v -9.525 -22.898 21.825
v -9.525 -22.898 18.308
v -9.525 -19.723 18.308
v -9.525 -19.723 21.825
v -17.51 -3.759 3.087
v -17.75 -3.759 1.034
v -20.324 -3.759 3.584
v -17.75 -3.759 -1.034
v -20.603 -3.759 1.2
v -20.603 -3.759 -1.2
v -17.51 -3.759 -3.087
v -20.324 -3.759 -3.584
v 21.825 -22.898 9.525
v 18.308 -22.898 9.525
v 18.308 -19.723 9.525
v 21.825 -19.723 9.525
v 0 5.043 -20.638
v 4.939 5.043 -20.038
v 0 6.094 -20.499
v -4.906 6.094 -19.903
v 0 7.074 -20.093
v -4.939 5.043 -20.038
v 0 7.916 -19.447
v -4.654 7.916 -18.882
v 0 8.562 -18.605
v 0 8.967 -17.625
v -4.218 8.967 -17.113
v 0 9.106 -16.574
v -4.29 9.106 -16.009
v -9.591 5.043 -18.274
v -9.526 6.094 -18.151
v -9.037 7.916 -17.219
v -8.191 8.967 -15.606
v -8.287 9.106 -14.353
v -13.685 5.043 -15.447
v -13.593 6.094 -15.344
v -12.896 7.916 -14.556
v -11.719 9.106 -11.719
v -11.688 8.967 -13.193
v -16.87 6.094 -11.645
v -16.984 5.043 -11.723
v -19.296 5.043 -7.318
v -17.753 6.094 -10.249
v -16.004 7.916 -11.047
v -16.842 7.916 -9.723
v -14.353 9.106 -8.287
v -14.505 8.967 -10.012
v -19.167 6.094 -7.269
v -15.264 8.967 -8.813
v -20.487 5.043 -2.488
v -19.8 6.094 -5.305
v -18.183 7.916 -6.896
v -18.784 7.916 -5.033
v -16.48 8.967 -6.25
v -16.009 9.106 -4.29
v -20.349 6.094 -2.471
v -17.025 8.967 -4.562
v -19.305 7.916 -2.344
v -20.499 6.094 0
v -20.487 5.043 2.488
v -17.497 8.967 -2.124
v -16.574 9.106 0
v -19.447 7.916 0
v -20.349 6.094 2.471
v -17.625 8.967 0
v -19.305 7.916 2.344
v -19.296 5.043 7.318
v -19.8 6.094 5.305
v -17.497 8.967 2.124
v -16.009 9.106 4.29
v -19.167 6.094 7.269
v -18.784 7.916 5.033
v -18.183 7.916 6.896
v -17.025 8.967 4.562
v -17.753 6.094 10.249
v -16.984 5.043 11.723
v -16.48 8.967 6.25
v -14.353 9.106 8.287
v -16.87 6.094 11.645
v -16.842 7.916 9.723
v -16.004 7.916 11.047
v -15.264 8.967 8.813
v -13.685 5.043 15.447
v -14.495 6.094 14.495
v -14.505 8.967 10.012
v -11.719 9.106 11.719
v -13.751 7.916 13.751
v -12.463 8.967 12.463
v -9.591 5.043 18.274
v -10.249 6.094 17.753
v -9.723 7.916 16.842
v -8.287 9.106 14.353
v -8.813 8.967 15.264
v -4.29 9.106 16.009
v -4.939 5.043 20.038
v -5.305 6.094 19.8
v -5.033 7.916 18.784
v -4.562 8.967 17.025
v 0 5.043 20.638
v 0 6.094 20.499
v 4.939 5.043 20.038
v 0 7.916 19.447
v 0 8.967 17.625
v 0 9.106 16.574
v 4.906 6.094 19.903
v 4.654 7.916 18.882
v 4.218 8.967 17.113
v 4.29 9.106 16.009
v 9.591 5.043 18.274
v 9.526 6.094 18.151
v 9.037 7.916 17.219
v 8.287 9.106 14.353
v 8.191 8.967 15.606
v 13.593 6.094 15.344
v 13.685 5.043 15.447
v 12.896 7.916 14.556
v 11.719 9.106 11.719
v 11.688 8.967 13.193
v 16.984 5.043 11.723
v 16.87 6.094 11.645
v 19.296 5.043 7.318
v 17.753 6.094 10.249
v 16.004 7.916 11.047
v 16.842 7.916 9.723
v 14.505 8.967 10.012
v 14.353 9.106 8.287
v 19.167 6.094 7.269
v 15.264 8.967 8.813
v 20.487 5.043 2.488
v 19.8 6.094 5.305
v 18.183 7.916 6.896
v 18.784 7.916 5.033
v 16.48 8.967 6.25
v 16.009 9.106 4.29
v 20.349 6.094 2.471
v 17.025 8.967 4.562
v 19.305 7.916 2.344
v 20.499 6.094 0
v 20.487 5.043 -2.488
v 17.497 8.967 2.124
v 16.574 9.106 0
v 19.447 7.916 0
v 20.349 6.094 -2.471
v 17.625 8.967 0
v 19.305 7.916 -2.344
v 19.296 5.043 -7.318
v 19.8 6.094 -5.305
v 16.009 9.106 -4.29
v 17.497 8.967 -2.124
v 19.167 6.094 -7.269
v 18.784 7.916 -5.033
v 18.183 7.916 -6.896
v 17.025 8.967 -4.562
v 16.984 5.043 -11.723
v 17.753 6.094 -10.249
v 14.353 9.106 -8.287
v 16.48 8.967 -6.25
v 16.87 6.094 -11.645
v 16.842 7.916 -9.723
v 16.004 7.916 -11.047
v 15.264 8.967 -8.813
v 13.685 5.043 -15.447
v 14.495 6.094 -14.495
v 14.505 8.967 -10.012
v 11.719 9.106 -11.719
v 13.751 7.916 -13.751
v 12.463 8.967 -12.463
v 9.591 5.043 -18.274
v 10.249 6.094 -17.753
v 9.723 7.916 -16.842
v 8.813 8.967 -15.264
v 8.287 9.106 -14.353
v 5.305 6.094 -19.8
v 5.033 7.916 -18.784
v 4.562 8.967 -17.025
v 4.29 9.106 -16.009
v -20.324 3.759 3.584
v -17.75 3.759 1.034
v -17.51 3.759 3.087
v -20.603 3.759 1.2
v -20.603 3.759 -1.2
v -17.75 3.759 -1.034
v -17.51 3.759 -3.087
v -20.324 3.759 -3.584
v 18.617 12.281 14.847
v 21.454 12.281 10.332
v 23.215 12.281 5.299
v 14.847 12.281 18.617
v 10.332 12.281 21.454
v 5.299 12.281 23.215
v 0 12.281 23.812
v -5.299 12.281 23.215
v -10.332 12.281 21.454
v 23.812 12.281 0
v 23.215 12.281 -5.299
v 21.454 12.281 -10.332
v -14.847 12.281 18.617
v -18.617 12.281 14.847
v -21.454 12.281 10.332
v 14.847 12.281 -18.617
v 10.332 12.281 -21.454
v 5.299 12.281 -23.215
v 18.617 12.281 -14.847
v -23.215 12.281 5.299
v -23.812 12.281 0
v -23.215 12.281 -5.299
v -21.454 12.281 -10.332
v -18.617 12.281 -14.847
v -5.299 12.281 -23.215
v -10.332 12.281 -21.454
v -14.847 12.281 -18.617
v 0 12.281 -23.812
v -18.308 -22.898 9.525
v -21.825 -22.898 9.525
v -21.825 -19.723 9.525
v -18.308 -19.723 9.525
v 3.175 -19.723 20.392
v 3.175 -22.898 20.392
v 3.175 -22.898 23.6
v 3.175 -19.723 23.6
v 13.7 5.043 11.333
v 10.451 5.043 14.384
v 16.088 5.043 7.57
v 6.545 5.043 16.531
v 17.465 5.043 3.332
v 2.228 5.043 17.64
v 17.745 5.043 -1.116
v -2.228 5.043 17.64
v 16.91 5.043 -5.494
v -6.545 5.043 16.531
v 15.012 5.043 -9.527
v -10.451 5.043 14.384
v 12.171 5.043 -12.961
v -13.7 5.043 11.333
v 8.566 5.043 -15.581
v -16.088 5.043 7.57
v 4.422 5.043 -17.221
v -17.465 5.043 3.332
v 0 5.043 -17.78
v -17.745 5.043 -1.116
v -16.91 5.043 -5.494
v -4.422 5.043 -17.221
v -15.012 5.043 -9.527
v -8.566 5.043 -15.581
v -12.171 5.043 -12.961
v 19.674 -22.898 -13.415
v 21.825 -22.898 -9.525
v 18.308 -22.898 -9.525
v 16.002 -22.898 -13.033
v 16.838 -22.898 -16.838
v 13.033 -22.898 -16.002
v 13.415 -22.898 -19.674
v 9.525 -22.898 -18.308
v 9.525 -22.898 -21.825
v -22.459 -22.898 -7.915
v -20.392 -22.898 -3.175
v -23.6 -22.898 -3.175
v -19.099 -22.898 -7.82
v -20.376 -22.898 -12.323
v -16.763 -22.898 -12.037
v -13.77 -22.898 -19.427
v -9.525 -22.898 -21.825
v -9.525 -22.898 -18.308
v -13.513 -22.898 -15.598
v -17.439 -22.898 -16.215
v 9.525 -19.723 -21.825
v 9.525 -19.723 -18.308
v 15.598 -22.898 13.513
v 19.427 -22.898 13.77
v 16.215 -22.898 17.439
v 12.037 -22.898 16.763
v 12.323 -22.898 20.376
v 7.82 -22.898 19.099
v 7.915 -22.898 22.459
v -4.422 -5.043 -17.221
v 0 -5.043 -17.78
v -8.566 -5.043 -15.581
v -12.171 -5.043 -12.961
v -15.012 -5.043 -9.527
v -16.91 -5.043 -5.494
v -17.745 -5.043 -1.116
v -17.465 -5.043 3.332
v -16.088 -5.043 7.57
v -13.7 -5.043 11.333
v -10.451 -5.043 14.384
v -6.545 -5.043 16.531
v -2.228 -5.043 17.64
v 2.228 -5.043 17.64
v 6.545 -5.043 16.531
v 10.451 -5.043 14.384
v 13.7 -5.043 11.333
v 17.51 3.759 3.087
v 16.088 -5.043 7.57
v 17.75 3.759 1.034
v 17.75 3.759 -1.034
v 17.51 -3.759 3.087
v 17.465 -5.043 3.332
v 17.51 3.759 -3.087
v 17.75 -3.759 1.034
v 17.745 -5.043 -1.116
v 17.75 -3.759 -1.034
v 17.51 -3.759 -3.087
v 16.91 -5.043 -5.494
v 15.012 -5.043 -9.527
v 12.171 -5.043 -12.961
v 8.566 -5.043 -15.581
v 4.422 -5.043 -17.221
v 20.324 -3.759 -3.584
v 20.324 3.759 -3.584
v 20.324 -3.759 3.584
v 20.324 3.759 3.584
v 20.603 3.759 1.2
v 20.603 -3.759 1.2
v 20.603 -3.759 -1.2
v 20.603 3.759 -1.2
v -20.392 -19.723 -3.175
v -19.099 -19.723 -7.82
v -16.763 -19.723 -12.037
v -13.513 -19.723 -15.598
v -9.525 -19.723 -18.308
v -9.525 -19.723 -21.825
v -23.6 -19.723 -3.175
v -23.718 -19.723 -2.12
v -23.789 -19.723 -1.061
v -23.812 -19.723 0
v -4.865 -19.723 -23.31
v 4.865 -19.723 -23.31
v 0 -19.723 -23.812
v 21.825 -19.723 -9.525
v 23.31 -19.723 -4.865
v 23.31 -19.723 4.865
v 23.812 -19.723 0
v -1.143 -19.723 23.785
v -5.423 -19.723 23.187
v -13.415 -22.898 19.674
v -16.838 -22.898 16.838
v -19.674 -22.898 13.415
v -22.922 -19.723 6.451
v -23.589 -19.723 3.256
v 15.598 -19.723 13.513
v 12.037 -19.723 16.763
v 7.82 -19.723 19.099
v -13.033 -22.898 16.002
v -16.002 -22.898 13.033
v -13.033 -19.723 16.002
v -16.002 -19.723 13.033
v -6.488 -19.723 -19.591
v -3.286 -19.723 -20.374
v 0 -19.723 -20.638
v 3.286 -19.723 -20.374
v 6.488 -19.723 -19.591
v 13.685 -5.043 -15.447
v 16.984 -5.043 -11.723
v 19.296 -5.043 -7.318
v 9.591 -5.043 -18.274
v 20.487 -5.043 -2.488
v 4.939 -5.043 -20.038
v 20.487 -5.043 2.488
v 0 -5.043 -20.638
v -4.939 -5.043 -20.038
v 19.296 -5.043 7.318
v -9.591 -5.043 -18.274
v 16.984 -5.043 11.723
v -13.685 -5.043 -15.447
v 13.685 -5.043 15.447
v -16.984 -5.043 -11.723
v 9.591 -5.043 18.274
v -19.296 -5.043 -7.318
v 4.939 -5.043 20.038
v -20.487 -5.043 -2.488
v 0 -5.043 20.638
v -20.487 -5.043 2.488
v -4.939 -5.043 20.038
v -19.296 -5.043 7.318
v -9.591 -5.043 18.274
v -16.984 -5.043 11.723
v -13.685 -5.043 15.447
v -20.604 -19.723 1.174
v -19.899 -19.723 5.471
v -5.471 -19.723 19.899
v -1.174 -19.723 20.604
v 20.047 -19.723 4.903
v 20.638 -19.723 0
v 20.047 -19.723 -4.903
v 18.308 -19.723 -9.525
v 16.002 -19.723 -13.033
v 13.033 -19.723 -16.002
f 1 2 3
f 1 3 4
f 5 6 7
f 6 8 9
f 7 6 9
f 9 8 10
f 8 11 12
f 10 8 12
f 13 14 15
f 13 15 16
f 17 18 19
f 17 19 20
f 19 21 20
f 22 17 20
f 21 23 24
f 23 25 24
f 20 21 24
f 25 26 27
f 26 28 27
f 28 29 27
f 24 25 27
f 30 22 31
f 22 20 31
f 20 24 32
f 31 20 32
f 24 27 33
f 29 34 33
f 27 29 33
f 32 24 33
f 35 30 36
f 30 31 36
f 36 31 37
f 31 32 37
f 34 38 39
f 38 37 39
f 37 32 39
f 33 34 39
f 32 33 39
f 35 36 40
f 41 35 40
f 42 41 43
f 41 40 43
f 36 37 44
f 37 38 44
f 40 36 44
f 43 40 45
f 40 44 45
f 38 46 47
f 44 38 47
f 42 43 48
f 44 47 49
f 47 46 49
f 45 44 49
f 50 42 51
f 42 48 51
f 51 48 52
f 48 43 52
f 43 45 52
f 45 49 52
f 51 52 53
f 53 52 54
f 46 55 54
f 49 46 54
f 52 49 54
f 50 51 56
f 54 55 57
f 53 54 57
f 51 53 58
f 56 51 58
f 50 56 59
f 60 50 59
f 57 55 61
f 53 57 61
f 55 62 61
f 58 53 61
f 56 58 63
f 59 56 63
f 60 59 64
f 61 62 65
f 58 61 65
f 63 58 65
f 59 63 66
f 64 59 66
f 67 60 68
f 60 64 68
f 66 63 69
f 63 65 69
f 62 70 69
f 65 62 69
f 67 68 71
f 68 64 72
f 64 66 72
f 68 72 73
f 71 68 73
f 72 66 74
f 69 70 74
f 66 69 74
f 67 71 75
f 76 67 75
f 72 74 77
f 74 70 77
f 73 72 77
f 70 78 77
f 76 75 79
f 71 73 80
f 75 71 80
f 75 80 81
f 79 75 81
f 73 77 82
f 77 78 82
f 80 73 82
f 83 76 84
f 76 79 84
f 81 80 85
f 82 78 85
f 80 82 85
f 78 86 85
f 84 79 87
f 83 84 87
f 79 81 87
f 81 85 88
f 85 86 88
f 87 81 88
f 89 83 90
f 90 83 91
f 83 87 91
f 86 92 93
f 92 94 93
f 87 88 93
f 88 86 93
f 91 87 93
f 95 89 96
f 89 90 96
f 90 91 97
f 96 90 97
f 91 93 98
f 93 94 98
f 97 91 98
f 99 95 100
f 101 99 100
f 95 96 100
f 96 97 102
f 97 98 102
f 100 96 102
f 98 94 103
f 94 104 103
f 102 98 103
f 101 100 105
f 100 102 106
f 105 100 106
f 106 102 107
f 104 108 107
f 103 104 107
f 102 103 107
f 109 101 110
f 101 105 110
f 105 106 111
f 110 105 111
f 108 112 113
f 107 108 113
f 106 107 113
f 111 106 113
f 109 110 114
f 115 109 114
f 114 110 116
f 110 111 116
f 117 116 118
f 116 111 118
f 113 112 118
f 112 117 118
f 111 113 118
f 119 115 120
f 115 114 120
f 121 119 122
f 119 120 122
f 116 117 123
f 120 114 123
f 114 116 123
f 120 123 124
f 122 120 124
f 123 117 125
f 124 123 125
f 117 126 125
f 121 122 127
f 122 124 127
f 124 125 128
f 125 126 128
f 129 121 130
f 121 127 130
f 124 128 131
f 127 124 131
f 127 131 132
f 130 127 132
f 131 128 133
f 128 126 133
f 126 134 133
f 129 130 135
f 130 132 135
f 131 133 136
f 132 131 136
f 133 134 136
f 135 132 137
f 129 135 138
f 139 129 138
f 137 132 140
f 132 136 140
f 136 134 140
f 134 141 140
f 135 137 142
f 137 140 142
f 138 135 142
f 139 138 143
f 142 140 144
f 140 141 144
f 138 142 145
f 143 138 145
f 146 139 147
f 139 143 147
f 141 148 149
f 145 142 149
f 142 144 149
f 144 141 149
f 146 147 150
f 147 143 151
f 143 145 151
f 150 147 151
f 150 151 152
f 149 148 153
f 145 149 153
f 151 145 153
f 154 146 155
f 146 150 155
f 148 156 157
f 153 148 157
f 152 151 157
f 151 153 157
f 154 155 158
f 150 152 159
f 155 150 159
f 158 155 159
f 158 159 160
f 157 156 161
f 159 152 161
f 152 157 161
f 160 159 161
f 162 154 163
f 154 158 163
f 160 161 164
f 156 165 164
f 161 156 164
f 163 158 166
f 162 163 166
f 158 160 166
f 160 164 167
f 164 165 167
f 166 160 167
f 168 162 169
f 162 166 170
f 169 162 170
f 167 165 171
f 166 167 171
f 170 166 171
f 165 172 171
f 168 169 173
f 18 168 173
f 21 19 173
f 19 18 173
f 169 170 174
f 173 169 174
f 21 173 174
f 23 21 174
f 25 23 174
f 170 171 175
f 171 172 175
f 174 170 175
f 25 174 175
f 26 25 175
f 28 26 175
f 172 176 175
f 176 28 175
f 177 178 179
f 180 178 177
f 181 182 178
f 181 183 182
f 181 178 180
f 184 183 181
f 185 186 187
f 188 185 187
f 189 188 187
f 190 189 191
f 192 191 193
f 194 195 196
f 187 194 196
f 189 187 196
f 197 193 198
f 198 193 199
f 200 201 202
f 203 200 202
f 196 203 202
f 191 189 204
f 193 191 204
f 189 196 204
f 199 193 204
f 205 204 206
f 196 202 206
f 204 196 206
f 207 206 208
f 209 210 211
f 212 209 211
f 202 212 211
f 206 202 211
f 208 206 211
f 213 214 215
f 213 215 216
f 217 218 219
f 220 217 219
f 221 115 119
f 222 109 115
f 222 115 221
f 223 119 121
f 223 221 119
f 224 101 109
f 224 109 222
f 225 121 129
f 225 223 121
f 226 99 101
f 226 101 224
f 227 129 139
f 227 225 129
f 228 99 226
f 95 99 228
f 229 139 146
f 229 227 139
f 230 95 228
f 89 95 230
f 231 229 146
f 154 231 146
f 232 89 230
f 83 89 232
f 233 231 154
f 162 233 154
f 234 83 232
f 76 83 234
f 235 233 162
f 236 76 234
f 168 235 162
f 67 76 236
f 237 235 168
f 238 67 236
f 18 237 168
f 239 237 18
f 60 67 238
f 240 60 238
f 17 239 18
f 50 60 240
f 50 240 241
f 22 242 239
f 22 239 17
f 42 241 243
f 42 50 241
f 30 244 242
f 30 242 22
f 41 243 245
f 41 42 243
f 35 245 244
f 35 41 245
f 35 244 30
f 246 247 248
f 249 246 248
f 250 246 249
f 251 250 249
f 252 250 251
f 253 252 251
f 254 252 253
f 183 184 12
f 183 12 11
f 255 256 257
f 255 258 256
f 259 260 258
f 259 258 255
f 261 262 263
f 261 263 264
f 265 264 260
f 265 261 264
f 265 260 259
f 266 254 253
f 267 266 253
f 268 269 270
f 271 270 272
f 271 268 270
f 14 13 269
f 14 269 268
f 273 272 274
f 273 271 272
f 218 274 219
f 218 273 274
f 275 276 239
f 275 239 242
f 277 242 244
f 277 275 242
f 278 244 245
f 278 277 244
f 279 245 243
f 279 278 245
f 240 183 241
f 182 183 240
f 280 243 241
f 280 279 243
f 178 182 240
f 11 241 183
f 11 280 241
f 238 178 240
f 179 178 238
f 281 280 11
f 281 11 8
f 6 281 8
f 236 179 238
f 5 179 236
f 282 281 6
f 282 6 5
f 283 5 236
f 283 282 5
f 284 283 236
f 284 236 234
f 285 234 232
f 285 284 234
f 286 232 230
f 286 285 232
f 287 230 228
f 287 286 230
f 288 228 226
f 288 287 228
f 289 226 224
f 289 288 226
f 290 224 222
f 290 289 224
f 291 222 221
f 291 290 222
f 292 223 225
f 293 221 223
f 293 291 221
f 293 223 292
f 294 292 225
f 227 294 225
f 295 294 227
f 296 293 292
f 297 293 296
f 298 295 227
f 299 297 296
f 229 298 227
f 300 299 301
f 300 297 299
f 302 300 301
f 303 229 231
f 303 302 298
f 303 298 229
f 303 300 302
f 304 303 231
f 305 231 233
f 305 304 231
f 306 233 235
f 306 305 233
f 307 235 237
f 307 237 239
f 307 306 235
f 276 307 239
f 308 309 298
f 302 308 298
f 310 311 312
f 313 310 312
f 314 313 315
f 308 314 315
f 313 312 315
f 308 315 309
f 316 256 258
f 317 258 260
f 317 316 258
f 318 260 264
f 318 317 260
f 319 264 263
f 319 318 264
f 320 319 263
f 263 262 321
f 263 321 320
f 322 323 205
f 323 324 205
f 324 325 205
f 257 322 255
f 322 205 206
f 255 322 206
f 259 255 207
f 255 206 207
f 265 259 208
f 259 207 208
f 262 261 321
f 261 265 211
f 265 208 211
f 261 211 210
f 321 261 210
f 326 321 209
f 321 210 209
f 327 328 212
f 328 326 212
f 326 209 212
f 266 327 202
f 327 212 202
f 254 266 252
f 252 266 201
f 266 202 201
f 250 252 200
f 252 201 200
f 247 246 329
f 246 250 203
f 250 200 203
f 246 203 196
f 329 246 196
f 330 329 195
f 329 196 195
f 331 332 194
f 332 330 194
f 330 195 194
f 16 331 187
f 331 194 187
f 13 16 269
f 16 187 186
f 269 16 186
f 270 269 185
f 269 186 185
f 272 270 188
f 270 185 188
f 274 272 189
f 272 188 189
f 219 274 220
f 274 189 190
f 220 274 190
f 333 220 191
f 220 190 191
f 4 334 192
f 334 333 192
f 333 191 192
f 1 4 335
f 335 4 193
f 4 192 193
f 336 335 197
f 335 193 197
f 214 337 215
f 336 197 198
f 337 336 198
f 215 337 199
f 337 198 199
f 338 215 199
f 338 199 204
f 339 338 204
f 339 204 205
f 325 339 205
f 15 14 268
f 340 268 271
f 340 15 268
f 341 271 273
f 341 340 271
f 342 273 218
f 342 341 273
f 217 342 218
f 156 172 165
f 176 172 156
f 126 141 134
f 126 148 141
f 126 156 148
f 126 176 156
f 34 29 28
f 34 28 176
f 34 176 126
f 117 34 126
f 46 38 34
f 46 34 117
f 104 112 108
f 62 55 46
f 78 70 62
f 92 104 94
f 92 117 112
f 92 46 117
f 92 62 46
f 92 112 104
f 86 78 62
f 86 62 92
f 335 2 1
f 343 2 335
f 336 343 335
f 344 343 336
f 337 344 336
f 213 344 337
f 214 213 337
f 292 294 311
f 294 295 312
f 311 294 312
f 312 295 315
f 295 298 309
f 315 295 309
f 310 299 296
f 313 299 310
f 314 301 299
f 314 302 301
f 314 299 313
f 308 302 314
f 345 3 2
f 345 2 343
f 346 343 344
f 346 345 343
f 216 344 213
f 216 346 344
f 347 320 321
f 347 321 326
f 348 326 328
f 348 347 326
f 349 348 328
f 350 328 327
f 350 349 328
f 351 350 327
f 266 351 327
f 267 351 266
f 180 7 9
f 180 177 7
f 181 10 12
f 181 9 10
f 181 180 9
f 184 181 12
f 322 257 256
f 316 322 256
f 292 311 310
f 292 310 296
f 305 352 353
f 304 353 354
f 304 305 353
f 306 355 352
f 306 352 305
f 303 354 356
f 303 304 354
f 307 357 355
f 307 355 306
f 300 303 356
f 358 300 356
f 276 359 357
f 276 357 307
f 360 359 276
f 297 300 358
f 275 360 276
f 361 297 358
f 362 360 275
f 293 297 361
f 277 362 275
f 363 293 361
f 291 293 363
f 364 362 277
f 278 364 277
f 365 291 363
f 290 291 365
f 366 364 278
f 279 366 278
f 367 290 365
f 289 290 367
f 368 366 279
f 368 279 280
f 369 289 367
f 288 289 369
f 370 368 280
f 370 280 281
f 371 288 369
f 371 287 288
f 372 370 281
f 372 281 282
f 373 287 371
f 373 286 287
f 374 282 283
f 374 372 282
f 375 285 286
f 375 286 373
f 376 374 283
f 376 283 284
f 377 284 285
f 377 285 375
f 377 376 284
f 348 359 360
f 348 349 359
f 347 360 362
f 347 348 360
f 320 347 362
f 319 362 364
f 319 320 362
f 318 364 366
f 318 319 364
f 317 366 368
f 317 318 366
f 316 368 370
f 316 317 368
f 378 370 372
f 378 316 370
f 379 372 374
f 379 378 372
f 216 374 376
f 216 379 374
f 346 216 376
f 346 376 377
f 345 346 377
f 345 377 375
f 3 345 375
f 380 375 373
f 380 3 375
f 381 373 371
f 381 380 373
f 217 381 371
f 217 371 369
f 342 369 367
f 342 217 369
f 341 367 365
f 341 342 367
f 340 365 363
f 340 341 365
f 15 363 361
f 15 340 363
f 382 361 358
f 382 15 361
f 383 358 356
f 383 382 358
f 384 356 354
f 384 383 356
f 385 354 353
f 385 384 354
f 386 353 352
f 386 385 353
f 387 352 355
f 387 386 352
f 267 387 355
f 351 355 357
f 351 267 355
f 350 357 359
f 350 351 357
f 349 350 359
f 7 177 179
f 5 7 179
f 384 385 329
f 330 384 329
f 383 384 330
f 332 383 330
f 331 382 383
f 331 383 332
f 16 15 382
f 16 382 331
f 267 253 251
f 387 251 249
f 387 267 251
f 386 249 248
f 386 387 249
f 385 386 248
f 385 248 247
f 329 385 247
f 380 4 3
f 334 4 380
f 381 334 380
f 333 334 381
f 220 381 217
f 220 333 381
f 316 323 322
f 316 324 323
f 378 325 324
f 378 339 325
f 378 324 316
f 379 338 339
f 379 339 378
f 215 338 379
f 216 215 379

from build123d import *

# Parameters (mm, degrees)
FILLET1_R            = 4.064
SKETCH10_W           = 2.857500069
SKETCH10_H           = 7.5184
REVOLVE3_ANGLE       = 20
CUT_EXTRUDE1_START   = 1.27
CUT_EXTRUDE1_DEPTH   = 4.9784
CIRPATTERN4_COUNT    = 2
FILLET8_R            = 1.27
FILLET9_R            = 1.27
SKETCH13_W           = 23.8125
SKETCH13_H           = 35.179
SKETCH14_OUTSIDE_W   = 64.822
SKETCH14_OUTSIDE_H   = 64.822
SKETCH14_OUTSIDE_W_2 = 18.870013955
SKETCH14_OUTSIDE_H_2 = 18.870013955
SKETCH14_OUTSIDE_W_3 = 25.220013955
SKETCH14_OUTSIDE_H_3 = 25.220013955
CUT_EXTRUDE2_DEPTH   = 3.175


with BuildPart() as part:
    # Sketch1 → Revolve1 (revolve)
    with BuildSketch(Plane.XY, mode=Mode.PRIVATE) as revolve1_sk:
        Polygon((0, 9.1059), (-20.6375, 9.1059), (-20.6375, 5.042647059), (-17.78, 5.042647059), (-17.78, -5.042647059), (-20.6375, -5.042647059), (-20.6375, -19.7231), (-16.51, -19.7231), (-16.51, -15.5956), (-18.0975, -15.5956), (-18.0975, -13.3096), (-16.51, -13.3096), (-16.51, 6.7564), (-3.8481, 6.7564), (-3.0861, 7.5184), (0, 7.5184), align=None)
    revolve(revolve1_sk.sketch.rotate(Axis((0, 0, 0), (0, 1, 0)), 270), axis=Axis((0, 0, 0), (0, 1, 0)))

    # Fillet1
    # the kernel refuses this fillet: 4.064 mm, written as the material it takes off along each edge
    with BuildSketch(Plane(origin=(0, 9.1059, 0), x_dir=(0, 0, -1), z_dir=(1, 0, 0))) as fillet1_piece_1:
        with BuildLine():
            CenterArc((16.573500069, -4.064), FILLET1_R, 0.010532312, 89.989467688)
            Line((20.6375, -4.063252941), (20.718779999, -4.063238))
            Line((20.718779999, -4.063238), (20.71878, 0))
            Line((20.71878, 0), (20.6375, 0.08128))
            Line((20.6375, 0.08128), (16.573500069, 0.08128))
            Line((16.573500069, 0.08128), (16.573500069, 0))
        make_face()
    revolve(axis=Axis((0, 9.1059, 0), (0, 1, 0)), mode=Mode.SUBTRACT)

    # Sketch10 → Revolve3 (revolve, symmetric)
    with BuildSketch(Plane.XY) as revolve3_sk:
        with Locations((-19.208750034, 0)):
            Rectangle(SKETCH10_W, SKETCH10_H)
    revolve3 = revolve(axis=Axis((0, 0, 0), (0, 1, 0)), revolution_arc=REVOLVE3_ANGLE / 2)
    revolve3 = revolve3 + revolve(revolve3_sk.sketch, axis=Axis((0, 0, 0), (0, -1, 0)), revolution_arc=REVOLVE3_ANGLE / 2)

    # Sketch12 → Cut-Extrude1 (cut)
    with BuildSketch(Plane(origin=(0, -3.7592, 0), x_dir=(1, 0, 0), z_dir=(0, 1, 0)).offset(CUT_EXTRUDE1_START)):
        with BuildLine():
            Line((-7.313638514, 0), (-17.215440903, 1.745954919))
            ThreePointArc((-17.215440903, 1.745954919), (-17.30375, 0), (-17.215440903, -1.745954919))
            Line((-17.215440903, -1.745954919), (-7.313638514, 0))
        make_face()
    cut_extrude1 = extrude(amount=CUT_EXTRUDE1_DEPTH, mode=Mode.SUBTRACT)

    # CirPattern4: Revolve3, Cut-Extrude1 ×2 about axis
    cirpattern4_axis = Axis((0, 0, 0), (0, 1, 0))
    add([revolve3.rotate(cirpattern4_axis, i * 360 / CIRPATTERN4_COUNT) for i in range(1, CIRPATTERN4_COUNT)])
    add([cut_extrude1.rotate(cirpattern4_axis, i * 360 / CIRPATTERN4_COUNT) for i in range(1, CIRPATTERN4_COUNT)], mode=Mode.SUBTRACT)

    # Fillet8
    # the kernel refuses this fillet: 1.27 mm, written as the material it takes off along each edge
    with BuildSketch(Plane(origin=(-16.431533746, -2.4892, -1.607730937), x_dir=(0.1324793231915166, 0, -0.9911857691304479), z_dir=(0, 1, 0)), Plane(origin=(16.431533746, -2.4892, 1.607730937), x_dir=(-0.13247932319151873, 0, 0.9911857691304475), z_dir=(0, 1, 0))) as fillet8_piece_1:
        with BuildLine():
            CenterArc((1.211424462, 1.269207194), FILLET8_R, 201.909884157, 66.065503548)
            Line((0.033154154, 0.795309438), (0.009588748, 0.785831483))
            ThreePointArc((0.009588748, 0.785831483), (-0.008800881, 0.398712653), (-0.025377958, 0.001057934))
            Line((-0.025377958, 0.001057934), (0.000897351, -0.025384144))
            ThreePointArc((0.000897351, -0.025384144), (0.583278445, -0.01509352), (1.165659538, -0.025384144))
            Line((1.165659538, -0.025384144), (1.166556889, 0))
        make_face()
    extrude(amount=4.9784, mode=Mode.SUBTRACT)
    with BuildSketch(Plane(origin=(-16.431533746, -2.4892, 1.607730937), x_dir=(0.13247932319152245, 0, 0.9911857691304472), z_dir=(0, 1, 0)), Plane(origin=(16.431533746, -2.4892, -1.607730937), x_dir=(-0.13247932319151992, 0, -0.9911857691304475), z_dir=(0, 1, 0))) as fillet8_piece_2:
        with BuildLine():
            CenterArc((1.211424462, -1.269207194), FILLET8_R, 92.024612295, 66.065503548)
            Line((0.033154154, -0.795309438), (0.009588748, -0.785831483))
            ThreePointArc((0.009588748, -0.785831483), (-0.008800881, -0.398712653), (-0.025377958, -0.001057934))
            Line((-0.025377958, -0.001057934), (0.000897351, 0.025384144))
            ThreePointArc((0.000897351, 0.025384144), (0.583278445, 0.01509352), (1.165659538, 0.025384144))
            Line((1.165659538, 0.025384144), (1.166556889, 0))
        make_face()
    extrude(amount=4.9784, mode=Mode.SUBTRACT)

    # Fillet9
    fillet9_edges = [part.edges().sort_by_distance(p)[0] for p in [
        (-17.215440903, 0, 1.745954919),
        (-17.215440903, 0, -1.745954919),
        (17.215440903, 0, -1.745954919),
        (17.215440903, 0, 1.745954919),
    ]]
    fillet(fillet9_edges, radius=FILLET9_R)


with BuildPart() as body_2:
    # Sketch13 → Revolve4 (revolve)
    with BuildSketch(Plane.XY):
        with Locations((-11.90625, -5.3086)):
            Rectangle(SKETCH13_W, SKETCH13_H)
    revolve(axis=Axis((0, 12.2809, 0), (0, -1, 0)))

    # Intersect1: read off the stored shape, not the designer's step
    # Intersect1: cut part
    add(part.part, mode=Mode.SUBTRACT)

    # Sketch14 outside → Cut-Extrude2 (cut)
    with BuildSketch(Plane.XZ.offset(22.8981)):
        Rectangle(SKETCH14_OUTSIDE_W, SKETCH14_OUTSIDE_H)
        with Locations((-18.960006978, 18.960006978)):
            Rectangle(SKETCH14_OUTSIDE_W_2, SKETCH14_OUTSIDE_H_2, mode=Mode.SUBTRACT)
        with Locations((15.785006978, 18.960006978)):
            Rectangle(SKETCH14_OUTSIDE_W_3, SKETCH14_OUTSIDE_H_2, mode=Mode.SUBTRACT)
        with Locations((-18.960006978, -15.785006978)):
            Rectangle(SKETCH14_OUTSIDE_W_2, SKETCH14_OUTSIDE_H_3, mode=Mode.SUBTRACT)
        with Locations((18.960006978, -18.960006978)):
            Rectangle(SKETCH14_OUTSIDE_W_2, SKETCH14_OUTSIDE_H_2, mode=Mode.SUBTRACT)
    extrude(amount=-CUT_EXTRUDE2_DEPTH, mode=Mode.SUBTRACT)

    # Sketch15 → Cut-Revolve5 (revolve, cut)
    with BuildSketch(Plane.XY):
        Polygon((0, -22.8981), (20.6375, -22.8981), (20.6375, -19.7231), (17.504044696, -19.7231), (17.504044696, -16.22202595), (19.900999595, -16.22202595), (19.900999595, -12.241789307), (17.504044696, -12.241789307), (17.504044696, 7.5184), (0, 7.5184), align=None)
    revolve(axis=Axis((0, 0, 0), (0, -1, 0)), mode=Mode.SUBTRACT)


solid = body_2.part
